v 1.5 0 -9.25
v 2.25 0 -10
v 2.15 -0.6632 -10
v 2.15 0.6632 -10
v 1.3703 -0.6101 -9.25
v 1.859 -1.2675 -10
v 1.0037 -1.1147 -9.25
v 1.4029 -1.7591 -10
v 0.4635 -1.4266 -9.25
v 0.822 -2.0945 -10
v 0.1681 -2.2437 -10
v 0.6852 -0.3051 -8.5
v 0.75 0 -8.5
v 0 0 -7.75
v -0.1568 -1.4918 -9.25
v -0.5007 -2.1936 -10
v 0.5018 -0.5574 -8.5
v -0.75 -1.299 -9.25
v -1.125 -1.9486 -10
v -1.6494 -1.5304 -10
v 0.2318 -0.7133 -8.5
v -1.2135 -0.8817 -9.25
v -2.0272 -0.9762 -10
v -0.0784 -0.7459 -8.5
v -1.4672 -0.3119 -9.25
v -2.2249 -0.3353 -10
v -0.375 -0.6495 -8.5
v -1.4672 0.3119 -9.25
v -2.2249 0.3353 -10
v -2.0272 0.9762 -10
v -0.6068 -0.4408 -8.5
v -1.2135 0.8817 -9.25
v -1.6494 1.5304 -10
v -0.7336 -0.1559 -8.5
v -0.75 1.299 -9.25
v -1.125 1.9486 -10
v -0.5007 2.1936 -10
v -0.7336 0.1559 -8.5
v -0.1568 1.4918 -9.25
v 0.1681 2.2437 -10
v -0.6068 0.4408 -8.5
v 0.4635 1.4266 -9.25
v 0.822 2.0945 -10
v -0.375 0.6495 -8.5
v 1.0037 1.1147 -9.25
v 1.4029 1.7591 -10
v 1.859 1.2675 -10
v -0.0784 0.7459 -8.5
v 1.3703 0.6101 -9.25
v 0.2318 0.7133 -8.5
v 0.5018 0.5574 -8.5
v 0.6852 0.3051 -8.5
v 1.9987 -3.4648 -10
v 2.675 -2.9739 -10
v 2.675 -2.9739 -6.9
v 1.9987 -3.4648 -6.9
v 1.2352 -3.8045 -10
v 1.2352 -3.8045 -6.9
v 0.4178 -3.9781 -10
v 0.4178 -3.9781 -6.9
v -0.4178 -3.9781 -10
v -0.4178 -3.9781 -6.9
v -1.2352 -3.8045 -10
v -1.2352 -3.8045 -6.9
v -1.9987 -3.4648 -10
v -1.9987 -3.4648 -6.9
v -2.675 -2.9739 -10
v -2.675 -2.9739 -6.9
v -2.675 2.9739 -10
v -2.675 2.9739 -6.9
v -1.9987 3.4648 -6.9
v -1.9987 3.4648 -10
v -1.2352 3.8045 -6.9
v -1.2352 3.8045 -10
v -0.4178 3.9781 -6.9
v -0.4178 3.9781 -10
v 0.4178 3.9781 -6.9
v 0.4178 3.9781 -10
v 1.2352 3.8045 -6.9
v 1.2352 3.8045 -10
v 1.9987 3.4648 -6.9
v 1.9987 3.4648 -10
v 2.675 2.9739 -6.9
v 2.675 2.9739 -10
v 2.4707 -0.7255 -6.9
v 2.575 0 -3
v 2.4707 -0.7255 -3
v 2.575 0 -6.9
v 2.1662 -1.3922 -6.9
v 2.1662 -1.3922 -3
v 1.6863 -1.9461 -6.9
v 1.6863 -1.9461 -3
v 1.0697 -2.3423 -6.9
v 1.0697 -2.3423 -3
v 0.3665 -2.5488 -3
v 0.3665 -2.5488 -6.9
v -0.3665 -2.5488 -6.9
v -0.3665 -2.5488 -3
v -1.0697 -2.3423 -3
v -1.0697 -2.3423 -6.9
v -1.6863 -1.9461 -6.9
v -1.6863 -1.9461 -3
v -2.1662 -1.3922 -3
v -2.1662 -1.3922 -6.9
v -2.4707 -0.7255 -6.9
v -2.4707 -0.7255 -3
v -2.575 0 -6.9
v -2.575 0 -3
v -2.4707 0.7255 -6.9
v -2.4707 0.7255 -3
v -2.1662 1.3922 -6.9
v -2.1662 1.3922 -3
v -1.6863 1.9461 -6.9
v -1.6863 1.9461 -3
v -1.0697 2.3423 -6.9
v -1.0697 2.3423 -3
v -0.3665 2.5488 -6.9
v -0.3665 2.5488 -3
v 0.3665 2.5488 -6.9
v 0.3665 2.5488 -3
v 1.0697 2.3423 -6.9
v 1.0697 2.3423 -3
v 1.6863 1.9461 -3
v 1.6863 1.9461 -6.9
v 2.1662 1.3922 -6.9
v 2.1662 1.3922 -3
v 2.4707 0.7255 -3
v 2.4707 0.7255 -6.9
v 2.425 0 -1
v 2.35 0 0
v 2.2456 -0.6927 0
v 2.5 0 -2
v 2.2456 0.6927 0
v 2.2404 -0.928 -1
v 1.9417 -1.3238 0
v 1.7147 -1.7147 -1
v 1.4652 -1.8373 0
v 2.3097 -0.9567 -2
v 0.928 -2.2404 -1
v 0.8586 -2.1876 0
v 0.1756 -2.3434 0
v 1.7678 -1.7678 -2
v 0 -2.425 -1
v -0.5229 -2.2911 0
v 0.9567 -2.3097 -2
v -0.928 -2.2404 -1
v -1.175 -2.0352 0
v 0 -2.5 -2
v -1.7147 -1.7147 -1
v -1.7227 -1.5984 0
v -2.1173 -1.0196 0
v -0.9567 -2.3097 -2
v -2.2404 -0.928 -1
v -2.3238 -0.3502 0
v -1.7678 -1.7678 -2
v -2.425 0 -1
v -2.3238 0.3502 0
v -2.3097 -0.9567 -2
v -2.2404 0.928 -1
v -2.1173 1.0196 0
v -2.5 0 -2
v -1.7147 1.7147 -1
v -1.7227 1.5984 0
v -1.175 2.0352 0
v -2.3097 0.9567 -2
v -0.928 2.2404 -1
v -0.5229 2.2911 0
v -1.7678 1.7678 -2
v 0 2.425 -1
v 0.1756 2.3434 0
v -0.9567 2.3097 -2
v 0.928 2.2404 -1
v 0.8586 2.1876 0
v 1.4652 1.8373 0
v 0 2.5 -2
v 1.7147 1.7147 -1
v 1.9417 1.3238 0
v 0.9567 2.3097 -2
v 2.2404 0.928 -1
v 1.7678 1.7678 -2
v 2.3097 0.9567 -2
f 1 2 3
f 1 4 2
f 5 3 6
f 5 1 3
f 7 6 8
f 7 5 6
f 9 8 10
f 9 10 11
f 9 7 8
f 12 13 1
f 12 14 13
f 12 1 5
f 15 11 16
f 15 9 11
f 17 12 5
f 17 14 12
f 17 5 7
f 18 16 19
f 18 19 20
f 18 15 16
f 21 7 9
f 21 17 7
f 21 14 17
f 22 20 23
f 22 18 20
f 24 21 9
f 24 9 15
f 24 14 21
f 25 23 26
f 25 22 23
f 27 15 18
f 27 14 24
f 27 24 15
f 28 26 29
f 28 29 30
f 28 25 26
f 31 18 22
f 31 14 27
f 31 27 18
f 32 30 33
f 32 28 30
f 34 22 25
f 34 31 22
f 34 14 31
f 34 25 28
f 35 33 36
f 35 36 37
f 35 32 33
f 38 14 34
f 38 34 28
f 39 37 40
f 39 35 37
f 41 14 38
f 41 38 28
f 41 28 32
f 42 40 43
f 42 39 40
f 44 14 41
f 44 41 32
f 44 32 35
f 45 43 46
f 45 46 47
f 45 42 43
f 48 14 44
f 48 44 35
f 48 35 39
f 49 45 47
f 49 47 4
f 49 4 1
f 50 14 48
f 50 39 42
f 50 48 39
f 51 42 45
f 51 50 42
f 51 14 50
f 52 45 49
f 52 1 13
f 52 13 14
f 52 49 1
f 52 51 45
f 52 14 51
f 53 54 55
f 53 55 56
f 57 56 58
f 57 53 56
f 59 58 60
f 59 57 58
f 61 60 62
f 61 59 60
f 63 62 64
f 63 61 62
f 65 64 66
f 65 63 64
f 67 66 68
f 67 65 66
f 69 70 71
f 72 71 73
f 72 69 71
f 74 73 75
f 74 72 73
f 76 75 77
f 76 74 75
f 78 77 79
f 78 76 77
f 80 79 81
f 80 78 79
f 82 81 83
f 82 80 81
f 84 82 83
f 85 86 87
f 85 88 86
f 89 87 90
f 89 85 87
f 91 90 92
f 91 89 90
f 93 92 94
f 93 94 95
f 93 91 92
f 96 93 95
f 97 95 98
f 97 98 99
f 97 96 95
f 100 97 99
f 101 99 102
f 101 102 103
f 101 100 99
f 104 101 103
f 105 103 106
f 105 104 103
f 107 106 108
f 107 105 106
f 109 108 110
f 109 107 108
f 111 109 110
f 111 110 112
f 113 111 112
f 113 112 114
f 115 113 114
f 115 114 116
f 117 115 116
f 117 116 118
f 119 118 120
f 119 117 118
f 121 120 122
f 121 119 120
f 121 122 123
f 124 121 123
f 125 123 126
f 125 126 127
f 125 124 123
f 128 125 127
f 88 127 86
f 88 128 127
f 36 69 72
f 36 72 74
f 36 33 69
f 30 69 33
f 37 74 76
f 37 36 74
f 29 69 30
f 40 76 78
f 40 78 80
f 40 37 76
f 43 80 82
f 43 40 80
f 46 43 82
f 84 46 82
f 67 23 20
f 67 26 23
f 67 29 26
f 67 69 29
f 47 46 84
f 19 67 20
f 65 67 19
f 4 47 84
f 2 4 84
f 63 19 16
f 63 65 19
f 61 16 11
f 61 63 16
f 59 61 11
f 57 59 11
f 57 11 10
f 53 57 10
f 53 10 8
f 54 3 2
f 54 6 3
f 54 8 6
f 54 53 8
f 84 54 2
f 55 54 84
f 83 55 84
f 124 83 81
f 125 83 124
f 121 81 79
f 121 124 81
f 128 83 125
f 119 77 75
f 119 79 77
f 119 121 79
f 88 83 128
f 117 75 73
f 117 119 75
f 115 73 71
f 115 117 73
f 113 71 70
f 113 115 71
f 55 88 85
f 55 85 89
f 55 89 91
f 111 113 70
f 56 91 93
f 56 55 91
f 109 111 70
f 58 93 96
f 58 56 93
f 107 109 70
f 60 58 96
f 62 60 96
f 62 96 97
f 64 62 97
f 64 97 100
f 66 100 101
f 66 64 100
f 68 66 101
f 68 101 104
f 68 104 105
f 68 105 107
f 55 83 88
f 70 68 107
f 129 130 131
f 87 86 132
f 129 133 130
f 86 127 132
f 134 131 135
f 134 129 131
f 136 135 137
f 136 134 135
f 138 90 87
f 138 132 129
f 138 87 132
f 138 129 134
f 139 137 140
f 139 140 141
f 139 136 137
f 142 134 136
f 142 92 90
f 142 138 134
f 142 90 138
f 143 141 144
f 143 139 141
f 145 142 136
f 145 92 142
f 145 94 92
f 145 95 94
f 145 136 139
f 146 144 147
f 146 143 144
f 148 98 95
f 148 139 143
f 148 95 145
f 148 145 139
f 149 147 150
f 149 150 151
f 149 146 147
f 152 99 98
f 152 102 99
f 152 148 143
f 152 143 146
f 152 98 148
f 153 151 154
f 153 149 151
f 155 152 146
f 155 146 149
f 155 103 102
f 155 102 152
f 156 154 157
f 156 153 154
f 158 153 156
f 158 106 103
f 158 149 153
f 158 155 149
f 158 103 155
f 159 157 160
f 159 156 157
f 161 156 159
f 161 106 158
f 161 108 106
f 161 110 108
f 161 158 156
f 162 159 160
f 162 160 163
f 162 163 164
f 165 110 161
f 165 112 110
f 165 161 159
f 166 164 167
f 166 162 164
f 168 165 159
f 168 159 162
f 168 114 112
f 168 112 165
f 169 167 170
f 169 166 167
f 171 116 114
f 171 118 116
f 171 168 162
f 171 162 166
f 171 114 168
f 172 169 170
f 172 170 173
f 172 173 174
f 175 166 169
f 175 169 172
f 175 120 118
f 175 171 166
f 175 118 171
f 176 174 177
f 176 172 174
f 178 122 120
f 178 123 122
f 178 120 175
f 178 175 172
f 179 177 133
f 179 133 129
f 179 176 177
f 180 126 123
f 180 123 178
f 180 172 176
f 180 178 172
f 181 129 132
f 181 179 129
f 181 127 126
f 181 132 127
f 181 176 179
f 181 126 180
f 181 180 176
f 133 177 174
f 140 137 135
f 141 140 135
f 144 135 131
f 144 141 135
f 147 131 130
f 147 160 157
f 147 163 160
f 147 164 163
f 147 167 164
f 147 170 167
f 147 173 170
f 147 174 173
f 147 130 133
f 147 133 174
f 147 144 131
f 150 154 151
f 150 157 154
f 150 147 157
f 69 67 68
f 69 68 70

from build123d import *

# Parameters (mm, degrees)
SKETCH2_W          = 2.584728437
SKETCH2_H          = 8.43239663
CUT_EXTRUDE1_DEPTH = 12.489125293


with BuildPart() as part:
    # Sketch1 → Revolve1 (revolve)
    with BuildSketch(Plane(origin=(0, 0, 0), x_dir=(0, 0, -1), z_dir=(1, 0, 0)), mode=Mode.PRIVATE) as revolve1_sk:
        Polygon((0, 0), (0, 2.35), (3, 2.575), (6.9, 2.575), (6.9, 4), (10, 4), (10, 2.25), (7.75, 0), align=None)
    revolve(revolve1_sk.sketch.rotate(Axis((0, 0, 0), (0, 0, -1)), 90), axis=Axis((0, 0, 0), (0, 0, -1)))

    # Sketch2 → Cut-Extrude1 (cut, through all)
    with BuildSketch(Plane(origin=(0, 0, -10), x_dir=(-1, 0, 0), z_dir=(0, 0, -1))):
        with Locations((3.967364219, 0)):
            Rectangle(SKETCH2_W, SKETCH2_H)
        with Locations((-3.967364219, 0)):
            Rectangle(SKETCH2_W, SKETCH2_H)
    extrude(amount=-CUT_EXTRUDE1_DEPTH, mode=Mode.SUBTRACT)


solid = part.part
